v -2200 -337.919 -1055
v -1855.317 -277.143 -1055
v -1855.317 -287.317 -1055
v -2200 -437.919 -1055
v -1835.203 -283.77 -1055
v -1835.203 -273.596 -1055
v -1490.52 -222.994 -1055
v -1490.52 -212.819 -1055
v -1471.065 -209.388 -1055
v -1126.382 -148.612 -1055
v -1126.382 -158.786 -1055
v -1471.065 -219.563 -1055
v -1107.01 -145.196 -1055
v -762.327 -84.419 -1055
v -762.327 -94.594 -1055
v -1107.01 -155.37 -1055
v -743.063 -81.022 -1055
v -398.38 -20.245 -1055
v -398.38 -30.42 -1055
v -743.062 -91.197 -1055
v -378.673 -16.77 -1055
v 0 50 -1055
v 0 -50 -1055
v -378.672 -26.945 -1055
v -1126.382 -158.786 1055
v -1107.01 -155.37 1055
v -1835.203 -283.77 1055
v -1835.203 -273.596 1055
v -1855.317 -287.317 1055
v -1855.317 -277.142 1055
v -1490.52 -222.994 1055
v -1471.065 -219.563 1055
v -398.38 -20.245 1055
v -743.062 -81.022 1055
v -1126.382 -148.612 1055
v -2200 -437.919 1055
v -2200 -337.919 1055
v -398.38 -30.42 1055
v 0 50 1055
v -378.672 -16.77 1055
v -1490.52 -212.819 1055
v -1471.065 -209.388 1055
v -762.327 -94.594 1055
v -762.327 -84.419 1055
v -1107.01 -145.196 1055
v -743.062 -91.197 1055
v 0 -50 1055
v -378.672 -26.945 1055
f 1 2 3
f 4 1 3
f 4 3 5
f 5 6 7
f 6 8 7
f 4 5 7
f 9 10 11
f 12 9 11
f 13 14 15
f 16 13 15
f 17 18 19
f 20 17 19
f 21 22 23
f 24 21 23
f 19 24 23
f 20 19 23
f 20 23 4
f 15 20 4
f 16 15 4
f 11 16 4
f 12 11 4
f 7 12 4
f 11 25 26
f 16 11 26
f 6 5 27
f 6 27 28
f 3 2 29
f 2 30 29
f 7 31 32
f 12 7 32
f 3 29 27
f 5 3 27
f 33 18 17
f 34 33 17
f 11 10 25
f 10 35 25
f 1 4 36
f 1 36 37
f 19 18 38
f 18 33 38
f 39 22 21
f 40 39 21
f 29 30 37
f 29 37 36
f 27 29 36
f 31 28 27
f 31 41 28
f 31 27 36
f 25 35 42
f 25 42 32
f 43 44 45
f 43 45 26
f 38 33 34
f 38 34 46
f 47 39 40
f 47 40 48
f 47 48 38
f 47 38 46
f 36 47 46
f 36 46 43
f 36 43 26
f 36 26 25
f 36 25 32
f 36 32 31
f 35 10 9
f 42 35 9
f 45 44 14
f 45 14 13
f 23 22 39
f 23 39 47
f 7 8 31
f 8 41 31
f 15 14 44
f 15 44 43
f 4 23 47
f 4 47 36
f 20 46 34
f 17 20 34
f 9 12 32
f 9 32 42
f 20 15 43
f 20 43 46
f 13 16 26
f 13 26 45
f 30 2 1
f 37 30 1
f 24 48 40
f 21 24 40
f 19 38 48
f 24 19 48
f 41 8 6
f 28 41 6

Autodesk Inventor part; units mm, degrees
ref_plane "YZ Plane" through (0, 0, 0) normal (1, 0, 0) x (0, 1, 0)
sketch "Sketch1" plane through (0, 0, 0) normal (1, 0, 0) x (0, 1, 0)
  line L0 (-50, 1055) -> (50, 1055)
  line L1 (50, 1055) -> (50, -1055)
  line L2 (50, -1055) -> (-50, -1055)
  line L3 (-50, -1055) -> (-50, 1055)
  line L4 (-50, 1055) -> (50, -1055) construction
  line L5 (50, 1055) -> (-50, -1055) construction
  point P0 (0, 0)
  dimension "d0" = 100
  dimension "d1" = 2110
ref_plane "Work Plane2" through (-2200, 50, 1055) normal (-1, 0, 0) x (0, 0, -1)
ref_plane "Work Plane1" through (0, 50, 1055) normal (-1, 0, 0) x (0, 0, -1)
sketch "Sketch2" plane through (-2200, 50, 1055) normal (-1, 0, 0) x (0, 0, -1)
  line L0 (2110, 0) -> (2110, 100) projected
  point P0 (1055, 50)
ref_plane "Work Plane3" through (-2200, 50, -1055) normal (0, 0, 1) x (0, -1, 0)
sketch "Sketch3" plane through (-2200, 50, -1055) normal (0, 0, 1) x (0, -1, 0)
  line L0 (0, 2200) -> (100, 2200) projected
  line L1 (0, 0) -> (100, 0) projected
  line L2 (0, 2200) -> (387.9194, 0)
  line L3 (0, 2200) -> (2233.9385, 2200) construction
  line L4 (100, 2200) -> (487.9194, 0)
  line L5 (100, 2200) -> (2333.9385, 2200) construction
  line L6 (487.9194, 0) -> (387.9194, 0)
  point P0 (50, 2200)
  dimension "d3" = 80
  dimension "d4" = 80
extrude "Extrusion1" add sketch "Sketch3" along normal blind 2110
sketch "Sketch4" plane through (-2200, 50, 1055) normal (0, 0, 1) x (1, 0, 0)
  line L0 (0, -387.9194) -> (0, -487.9194) projected
  line L1 (0, -387.9194) -> (344.6827, -327.1425)
  line L2 (2200, 0) -> (0, -387.9194) projected
  line L3 (344.6827, -327.1425) -> (344.6827, -337.3172)
  line L4 (344.6827, -337.3172) -> (364.7974, -333.7704)
  line L5 (364.7974, -333.7704) -> (364.7974, -323.5957)
  line L6 (364.7974, -323.5957) -> (709.4801, -262.8189)
  line L7 (709.4801, -262.8189) -> (709.4801, -272.9936)
  line L8 (709.4801, -272.9936) -> (728.9354, -269.5631)
  line L9 (728.9354, -269.5631) -> (728.9354, -259.3884)
  line L10 (728.9354, -259.3884) -> (1073.6181, -198.6115)
  line L11 (1073.6181, -198.6115) -> (1073.6181, -208.7862)
  line L12 (1073.6181, -208.7862) -> (1092.9901, -205.3704)
  line L13 (1092.9901, -205.3704) -> (1092.9901, -195.1957)
  line L14 (1092.9901, -195.1957) -> (1437.6728, -134.4189)
  line L15 (1437.6728, -134.4189) -> (1437.6728, -144.5935)
  line L16 (1437.6728, -144.5935) -> (1456.9375, -141.1967)
  line L17 (1456.9375, -141.1967) -> (1456.9375, -131.022)
  line L18 (1456.9375, -131.022) -> (1801.6202, -70.2451)
  line L19 (1801.6202, -70.2451) -> (1801.6202, -80.4198)
  line L20 (1801.6202, -80.4198) -> (1821.3275, -76.9449)
  line L21 (1821.3275, -76.9449) -> (1821.3275, -66.7702)
  line L22 (1821.3275, -66.7702) -> (2200, 0)
  line L23 (1821.3275, -66.7702) -> (344.6827, -327.1425)
  point P0 (2200, -50)
  dimension "d7" = 350
  dimension "d8" = 350
  dimension "d9" = 350
  dimension "d10" = 350
  dimension "d11" = 350
extrude "Extrusion2" cut sketch "Sketch4" against normal through all
properties part number "eave_panel_side" material "Wood (Maple)"
